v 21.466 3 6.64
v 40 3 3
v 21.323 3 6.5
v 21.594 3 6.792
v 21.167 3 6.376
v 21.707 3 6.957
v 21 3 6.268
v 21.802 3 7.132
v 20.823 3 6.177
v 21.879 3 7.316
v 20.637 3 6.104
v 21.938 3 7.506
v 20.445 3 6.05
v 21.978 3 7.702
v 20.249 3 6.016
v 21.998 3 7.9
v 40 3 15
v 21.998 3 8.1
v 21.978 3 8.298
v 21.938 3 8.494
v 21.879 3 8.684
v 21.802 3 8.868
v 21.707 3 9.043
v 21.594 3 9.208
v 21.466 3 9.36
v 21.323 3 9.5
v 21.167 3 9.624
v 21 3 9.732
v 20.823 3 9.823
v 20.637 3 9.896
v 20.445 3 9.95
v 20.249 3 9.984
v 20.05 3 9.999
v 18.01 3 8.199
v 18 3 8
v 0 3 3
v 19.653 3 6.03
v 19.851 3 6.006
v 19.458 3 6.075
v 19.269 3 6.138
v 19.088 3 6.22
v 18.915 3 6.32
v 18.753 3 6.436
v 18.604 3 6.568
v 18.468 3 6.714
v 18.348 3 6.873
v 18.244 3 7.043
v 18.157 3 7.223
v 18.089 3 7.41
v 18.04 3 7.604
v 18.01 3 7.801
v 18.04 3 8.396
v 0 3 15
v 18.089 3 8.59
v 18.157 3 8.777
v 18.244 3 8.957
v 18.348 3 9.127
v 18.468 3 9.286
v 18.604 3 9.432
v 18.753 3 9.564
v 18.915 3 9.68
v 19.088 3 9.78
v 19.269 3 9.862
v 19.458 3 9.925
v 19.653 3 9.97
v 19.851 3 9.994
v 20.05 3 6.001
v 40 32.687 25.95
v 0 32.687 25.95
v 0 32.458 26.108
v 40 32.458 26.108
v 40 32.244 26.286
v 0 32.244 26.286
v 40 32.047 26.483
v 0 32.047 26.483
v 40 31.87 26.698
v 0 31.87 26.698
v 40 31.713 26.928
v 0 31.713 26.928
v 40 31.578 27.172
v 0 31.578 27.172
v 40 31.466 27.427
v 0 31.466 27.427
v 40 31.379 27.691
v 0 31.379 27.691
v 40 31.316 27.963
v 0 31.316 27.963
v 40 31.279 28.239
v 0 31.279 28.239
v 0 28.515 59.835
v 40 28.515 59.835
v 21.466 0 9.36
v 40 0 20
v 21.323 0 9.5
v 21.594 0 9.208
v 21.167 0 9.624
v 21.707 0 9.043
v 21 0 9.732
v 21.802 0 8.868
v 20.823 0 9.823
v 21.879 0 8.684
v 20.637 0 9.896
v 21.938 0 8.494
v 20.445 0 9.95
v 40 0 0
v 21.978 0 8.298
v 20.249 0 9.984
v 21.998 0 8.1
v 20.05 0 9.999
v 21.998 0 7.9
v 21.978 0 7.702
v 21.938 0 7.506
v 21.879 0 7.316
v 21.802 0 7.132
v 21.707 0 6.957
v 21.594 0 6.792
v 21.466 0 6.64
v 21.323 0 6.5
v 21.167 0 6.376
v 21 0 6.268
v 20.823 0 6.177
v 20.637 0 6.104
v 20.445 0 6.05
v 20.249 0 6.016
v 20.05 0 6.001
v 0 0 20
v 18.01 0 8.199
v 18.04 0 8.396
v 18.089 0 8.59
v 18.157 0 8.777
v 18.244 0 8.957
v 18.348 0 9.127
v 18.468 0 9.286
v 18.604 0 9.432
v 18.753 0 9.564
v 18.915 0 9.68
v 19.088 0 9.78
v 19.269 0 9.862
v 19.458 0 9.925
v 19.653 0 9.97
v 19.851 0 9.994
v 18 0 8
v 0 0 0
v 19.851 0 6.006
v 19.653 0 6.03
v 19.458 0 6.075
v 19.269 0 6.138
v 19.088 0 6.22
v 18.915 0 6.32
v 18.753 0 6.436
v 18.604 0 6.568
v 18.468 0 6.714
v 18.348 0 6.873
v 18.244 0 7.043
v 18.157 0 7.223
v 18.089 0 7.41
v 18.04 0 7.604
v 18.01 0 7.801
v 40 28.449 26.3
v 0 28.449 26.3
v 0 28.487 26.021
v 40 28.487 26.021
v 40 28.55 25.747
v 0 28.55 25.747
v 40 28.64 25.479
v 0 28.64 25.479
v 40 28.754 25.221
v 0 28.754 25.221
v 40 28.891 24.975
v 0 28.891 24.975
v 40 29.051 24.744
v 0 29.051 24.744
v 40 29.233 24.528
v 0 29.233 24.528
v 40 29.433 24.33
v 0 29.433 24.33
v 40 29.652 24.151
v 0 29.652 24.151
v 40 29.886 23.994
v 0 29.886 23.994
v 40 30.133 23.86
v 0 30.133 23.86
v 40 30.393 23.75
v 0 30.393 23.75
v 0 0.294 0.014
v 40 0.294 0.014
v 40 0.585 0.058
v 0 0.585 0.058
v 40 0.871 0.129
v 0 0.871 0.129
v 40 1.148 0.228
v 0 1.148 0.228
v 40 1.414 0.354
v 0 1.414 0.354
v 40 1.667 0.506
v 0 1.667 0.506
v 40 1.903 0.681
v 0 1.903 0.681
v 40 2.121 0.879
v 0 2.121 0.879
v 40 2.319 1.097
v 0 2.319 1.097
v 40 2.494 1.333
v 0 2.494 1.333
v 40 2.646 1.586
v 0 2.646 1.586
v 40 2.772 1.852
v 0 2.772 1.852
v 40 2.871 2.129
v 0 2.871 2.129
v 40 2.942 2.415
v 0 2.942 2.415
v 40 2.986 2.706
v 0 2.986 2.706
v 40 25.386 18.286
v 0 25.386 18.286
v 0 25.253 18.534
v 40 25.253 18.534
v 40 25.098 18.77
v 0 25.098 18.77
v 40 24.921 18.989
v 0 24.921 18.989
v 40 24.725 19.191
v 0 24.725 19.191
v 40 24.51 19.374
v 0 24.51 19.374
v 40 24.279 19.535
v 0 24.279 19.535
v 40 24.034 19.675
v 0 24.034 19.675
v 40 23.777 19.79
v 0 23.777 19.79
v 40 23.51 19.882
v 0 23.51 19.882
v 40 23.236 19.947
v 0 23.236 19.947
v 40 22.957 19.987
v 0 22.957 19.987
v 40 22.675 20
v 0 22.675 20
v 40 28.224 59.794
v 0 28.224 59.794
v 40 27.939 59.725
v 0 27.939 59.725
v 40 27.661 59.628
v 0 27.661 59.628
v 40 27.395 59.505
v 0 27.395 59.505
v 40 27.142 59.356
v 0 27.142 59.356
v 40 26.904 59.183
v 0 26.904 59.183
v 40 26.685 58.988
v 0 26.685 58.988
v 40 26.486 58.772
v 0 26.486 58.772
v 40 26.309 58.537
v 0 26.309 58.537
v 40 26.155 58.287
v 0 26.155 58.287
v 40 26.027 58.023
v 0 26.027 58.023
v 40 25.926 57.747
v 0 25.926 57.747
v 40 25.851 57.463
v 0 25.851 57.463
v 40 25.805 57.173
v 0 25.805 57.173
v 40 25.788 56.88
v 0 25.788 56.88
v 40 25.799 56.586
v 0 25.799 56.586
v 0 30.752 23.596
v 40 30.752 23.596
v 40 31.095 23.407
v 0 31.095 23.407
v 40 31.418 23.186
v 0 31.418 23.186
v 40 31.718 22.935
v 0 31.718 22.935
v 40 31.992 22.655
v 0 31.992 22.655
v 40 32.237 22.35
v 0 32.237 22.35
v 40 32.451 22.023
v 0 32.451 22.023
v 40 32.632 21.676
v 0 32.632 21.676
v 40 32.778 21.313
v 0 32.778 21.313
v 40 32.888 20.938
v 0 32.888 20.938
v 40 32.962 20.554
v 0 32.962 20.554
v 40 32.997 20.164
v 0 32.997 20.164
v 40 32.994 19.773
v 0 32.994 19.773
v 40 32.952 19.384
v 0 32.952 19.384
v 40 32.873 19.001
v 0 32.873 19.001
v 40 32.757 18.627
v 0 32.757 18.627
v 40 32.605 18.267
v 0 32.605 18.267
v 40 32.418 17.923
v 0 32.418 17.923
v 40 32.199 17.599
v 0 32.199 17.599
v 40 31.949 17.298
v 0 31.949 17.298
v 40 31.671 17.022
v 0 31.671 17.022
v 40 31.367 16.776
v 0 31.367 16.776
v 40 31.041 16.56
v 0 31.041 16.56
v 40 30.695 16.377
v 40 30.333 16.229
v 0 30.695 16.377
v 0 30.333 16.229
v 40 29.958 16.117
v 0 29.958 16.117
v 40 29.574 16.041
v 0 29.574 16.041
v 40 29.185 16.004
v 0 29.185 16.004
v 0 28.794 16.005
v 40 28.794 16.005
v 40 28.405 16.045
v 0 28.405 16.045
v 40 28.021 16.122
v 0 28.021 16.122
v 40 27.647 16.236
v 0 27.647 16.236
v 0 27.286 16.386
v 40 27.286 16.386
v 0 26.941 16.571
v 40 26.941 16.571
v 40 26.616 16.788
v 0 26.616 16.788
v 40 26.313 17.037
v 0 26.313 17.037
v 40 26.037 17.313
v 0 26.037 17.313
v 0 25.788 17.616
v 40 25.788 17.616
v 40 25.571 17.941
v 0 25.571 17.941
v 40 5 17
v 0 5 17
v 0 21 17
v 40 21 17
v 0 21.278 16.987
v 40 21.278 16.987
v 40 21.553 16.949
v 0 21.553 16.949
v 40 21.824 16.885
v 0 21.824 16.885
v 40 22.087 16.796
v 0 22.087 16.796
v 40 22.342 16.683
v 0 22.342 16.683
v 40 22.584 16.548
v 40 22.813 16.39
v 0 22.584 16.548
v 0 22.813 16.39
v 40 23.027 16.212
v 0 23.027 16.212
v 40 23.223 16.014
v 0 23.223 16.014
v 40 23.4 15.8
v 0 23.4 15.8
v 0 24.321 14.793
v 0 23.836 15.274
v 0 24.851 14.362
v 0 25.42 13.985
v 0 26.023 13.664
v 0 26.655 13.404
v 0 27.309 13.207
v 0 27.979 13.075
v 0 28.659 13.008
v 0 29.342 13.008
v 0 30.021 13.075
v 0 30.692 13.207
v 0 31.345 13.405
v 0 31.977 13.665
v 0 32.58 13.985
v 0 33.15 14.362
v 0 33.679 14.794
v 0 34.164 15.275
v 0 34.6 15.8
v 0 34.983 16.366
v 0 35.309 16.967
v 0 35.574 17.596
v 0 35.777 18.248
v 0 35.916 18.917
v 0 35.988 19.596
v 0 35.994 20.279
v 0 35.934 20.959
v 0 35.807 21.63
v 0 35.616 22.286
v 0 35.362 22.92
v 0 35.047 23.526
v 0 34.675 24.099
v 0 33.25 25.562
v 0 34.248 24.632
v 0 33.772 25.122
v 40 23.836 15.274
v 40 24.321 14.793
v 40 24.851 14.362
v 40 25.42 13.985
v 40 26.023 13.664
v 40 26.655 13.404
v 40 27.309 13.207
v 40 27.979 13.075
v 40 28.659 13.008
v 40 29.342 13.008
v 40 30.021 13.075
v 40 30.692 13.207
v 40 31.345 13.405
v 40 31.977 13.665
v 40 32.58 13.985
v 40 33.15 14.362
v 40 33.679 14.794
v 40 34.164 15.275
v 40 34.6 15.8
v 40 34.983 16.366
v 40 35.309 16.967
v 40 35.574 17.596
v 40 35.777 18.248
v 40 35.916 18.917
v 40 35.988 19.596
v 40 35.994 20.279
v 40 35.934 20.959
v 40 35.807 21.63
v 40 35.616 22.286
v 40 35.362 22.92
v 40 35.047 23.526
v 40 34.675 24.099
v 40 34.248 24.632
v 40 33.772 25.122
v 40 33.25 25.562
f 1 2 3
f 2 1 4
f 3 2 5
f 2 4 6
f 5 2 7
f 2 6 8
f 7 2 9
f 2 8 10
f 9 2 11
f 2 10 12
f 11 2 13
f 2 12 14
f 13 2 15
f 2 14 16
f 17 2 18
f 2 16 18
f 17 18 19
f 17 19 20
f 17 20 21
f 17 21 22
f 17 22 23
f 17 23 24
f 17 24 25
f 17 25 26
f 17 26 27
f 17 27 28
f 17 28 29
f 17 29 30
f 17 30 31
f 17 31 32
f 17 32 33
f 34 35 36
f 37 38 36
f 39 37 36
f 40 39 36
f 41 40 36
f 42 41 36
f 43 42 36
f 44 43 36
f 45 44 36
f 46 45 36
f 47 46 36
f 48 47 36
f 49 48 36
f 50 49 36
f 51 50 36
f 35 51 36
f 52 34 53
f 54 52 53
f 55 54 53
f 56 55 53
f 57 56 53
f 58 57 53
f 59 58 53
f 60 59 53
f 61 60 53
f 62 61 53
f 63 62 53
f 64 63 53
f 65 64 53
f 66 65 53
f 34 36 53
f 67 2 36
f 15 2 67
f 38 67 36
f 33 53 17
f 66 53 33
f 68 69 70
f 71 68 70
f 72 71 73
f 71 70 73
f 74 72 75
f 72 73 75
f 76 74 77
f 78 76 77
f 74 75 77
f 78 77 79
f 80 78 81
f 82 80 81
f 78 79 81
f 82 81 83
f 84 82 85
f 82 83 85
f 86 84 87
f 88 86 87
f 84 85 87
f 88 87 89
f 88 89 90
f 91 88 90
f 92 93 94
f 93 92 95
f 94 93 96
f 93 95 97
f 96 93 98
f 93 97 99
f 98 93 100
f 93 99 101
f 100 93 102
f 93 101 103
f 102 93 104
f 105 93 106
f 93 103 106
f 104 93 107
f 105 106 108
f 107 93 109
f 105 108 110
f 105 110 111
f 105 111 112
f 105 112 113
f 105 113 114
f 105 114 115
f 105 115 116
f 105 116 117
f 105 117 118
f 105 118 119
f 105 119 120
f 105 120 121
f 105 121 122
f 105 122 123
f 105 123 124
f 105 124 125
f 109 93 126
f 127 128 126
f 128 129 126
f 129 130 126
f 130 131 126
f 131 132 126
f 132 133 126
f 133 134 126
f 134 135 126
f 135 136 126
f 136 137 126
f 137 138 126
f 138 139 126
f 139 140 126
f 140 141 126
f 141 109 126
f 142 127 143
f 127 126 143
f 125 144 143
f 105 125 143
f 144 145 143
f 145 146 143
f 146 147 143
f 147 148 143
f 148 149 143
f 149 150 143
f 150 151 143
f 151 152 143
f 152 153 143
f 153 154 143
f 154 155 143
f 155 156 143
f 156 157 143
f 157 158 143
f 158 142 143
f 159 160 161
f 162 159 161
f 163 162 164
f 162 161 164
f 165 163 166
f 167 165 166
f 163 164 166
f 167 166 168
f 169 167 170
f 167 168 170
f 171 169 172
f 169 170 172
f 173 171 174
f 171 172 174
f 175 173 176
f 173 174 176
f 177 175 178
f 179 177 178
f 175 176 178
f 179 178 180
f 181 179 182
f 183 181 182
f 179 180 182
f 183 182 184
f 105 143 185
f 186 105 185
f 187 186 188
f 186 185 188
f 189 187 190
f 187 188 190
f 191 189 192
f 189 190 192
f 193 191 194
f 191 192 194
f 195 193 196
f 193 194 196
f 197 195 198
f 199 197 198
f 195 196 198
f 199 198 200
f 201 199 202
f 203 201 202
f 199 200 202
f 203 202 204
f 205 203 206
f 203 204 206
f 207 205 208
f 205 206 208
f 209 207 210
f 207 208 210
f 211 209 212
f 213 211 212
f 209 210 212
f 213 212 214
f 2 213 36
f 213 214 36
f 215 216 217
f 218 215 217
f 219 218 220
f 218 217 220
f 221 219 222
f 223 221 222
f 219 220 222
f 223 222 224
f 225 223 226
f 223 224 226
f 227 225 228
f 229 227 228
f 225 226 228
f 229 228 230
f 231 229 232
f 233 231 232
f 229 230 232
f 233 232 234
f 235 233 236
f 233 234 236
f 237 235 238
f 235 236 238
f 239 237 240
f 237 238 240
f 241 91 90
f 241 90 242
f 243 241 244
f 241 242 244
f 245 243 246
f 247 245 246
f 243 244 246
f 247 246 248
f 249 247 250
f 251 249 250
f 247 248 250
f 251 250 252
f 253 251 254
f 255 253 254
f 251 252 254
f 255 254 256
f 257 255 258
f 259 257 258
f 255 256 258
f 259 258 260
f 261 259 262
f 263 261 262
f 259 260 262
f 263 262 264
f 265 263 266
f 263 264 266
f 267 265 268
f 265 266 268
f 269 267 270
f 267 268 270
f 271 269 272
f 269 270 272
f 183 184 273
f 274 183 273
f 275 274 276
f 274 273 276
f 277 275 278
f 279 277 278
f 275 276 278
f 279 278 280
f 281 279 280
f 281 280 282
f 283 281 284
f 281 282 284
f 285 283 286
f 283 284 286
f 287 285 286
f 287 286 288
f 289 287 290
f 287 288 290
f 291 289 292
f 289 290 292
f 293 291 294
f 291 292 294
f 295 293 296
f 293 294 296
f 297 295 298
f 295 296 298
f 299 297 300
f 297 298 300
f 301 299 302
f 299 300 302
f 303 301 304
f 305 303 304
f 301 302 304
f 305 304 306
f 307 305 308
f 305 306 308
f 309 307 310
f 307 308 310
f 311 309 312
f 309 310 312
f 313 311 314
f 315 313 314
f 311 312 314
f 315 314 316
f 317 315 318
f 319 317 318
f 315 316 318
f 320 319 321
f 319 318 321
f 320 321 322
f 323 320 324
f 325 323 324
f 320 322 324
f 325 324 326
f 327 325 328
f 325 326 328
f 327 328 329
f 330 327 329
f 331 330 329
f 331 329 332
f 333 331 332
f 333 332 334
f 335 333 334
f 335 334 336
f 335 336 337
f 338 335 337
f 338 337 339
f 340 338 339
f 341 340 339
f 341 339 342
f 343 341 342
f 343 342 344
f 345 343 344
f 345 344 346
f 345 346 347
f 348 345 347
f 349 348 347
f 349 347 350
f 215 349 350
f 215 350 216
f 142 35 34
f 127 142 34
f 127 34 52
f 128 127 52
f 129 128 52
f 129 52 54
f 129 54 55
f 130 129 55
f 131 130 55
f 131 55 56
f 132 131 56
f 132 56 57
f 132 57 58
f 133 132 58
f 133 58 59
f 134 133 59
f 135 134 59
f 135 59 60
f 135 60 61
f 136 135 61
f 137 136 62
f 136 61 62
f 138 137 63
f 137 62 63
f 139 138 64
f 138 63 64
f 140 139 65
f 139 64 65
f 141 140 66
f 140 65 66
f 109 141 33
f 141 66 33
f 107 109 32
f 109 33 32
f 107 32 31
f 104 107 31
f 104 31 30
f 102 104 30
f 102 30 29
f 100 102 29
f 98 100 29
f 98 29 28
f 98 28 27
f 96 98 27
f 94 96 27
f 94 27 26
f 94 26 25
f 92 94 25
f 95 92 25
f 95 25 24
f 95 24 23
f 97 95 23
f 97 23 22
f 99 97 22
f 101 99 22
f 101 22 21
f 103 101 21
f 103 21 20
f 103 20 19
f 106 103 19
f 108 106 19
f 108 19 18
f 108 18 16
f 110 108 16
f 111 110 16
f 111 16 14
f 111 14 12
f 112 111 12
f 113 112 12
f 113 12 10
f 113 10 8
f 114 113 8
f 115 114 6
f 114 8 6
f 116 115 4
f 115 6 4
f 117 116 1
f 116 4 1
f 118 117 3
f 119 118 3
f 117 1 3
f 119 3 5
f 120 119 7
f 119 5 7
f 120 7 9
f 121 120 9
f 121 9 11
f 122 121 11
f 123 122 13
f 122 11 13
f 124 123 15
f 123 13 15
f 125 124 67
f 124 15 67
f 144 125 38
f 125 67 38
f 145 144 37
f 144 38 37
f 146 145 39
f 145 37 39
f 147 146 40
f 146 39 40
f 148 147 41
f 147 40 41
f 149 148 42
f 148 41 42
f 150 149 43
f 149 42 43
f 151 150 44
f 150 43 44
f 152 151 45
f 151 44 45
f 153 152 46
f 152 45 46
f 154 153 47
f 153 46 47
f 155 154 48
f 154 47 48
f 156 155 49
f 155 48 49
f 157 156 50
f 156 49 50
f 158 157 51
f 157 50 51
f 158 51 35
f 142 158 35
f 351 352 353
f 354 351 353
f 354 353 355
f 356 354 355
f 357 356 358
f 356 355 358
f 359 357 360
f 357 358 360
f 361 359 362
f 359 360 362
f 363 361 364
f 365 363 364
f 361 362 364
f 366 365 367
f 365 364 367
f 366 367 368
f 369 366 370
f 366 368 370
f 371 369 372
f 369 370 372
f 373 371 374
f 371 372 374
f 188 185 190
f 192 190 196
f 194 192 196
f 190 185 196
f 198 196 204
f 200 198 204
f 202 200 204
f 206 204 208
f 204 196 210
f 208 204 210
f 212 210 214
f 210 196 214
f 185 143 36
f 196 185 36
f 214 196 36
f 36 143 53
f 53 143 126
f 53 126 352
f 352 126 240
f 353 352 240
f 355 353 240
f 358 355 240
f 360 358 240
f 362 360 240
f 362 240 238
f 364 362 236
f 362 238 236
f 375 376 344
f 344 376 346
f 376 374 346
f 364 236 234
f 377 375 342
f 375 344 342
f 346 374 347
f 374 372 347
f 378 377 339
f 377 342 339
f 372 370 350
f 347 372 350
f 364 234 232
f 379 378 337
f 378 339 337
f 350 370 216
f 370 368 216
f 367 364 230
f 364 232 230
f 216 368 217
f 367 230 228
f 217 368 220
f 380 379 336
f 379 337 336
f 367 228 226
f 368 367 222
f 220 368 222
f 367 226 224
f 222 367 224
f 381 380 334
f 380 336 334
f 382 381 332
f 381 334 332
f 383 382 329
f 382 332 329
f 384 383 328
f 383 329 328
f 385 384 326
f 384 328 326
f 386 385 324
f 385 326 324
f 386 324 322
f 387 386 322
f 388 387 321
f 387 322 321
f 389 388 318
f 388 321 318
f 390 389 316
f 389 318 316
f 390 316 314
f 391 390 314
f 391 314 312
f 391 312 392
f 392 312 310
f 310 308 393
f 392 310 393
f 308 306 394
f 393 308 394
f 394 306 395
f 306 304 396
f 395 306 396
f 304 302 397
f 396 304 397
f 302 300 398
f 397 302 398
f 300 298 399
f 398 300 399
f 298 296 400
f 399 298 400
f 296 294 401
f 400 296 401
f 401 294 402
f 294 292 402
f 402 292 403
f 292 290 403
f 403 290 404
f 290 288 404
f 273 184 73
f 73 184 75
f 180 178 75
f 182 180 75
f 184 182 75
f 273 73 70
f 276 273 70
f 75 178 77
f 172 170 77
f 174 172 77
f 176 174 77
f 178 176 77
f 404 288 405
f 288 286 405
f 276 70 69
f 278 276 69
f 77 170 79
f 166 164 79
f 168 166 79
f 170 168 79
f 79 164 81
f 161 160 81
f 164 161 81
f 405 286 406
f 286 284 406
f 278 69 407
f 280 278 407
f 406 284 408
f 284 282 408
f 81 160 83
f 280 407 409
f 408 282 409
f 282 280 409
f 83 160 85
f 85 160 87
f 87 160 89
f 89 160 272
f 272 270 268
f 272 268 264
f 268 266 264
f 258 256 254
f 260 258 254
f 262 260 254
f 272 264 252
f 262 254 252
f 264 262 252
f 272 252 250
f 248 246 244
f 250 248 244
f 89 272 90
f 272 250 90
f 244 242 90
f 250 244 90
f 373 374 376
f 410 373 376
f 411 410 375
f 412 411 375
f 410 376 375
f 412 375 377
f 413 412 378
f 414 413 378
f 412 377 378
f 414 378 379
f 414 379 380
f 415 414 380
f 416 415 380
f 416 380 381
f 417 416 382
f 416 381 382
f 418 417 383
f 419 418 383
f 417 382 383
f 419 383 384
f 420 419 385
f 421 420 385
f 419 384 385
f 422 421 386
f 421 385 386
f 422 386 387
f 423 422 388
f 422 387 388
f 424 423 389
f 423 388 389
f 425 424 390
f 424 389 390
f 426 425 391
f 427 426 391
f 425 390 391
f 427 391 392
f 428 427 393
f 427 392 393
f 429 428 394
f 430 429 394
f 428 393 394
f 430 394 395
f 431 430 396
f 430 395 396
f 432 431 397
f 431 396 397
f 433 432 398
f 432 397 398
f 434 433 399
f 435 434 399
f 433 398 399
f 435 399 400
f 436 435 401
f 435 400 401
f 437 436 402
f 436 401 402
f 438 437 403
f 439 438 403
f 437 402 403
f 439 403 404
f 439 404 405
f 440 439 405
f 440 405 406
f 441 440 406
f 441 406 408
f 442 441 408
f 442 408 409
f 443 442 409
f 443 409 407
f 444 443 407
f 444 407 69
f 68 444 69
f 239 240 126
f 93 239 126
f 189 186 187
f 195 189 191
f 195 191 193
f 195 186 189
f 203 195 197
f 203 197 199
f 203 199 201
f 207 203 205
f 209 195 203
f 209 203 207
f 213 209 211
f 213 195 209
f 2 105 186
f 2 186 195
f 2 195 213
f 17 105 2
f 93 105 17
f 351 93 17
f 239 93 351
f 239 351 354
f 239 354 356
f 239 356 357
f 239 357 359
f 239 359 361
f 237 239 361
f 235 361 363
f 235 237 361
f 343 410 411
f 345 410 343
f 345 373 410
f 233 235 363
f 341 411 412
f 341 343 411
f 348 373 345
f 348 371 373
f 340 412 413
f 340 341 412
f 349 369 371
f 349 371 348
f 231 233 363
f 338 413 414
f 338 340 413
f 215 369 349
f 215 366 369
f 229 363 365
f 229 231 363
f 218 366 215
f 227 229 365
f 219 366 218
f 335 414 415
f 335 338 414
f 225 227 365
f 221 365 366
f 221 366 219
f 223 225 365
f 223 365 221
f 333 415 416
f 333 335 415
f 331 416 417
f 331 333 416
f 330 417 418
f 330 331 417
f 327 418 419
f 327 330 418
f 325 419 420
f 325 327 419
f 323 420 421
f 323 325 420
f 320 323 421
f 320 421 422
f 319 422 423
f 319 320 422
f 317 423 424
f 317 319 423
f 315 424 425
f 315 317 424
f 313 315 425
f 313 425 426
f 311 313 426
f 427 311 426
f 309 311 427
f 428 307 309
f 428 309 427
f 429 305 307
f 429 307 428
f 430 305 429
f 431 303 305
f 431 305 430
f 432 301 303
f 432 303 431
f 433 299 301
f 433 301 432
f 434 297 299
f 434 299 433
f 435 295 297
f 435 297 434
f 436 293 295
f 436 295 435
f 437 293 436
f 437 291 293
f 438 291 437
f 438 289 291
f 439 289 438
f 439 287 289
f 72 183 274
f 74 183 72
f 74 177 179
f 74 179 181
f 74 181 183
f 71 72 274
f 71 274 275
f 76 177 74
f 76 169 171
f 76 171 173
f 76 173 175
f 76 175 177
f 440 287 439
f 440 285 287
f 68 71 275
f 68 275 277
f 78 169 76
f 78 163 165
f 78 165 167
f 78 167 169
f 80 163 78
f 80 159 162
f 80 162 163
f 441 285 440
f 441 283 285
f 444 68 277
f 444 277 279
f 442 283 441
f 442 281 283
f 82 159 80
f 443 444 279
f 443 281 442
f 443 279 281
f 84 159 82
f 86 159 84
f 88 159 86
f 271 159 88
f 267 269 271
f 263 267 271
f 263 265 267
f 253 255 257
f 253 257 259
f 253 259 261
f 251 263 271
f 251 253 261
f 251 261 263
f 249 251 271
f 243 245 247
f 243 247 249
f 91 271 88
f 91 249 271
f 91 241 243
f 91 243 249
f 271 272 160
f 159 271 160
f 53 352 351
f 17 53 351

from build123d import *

# Parameters (mm, degrees)
F1_DEPTH = 40
F2_R     = 2
F3_DEPTH = 9.6
F4_SIZE  = 2


with BuildPart() as f1:
    # F0 (on Right) → F1 (new body)
    with BuildSketch(Plane.YZ):
        with BuildLine():
            Line((0, 20), (0, 0))
            ThreePointArc((0, 0), (2.12132, 0.87868), (3, 3))
            Line((3, 3), (3, 17))
            Line((3, 17), (21, 17))
            ThreePointArc((21, 17), (22.341641, 16.683282), (23.4, 15.8))
            ThreePointArc((23.4, 15.8), (34.164312, 15.27455), (32.687463, 25.95001))
            ThreePointArc((32.687463, 25.95001), (31.712786, 26.927793), (31.279221, 28.238547))
            Line((31.279221, 28.238547), (28.514858, 59.835355))
            ThreePointArc((28.514858, 59.835355), (26.485898, 58.771775), (25.799112, 56.586321))
            Line((25.799112, 56.586321), (28.448779, 26.300488))
            ThreePointArc((28.448779, 26.300488), (29.051308, 24.74351), (30.392779, 23.749689))
            ThreePointArc((30.392779, 23.749689), (31.949109, 17.297639), (25.385968, 18.285714))
            ThreePointArc((25.385968, 18.285714), (24.279012, 19.535463), (22.675445, 20))
            Line((22.675445, 20), (0, 20))
        make_face()
    extrude(amount=F1_DEPTH)

    # F2 (on face) → F3 (cut)
    with BuildSketch(Plane(origin=(0, 3, 0), x_dir=(-1, 0, 0), z_dir=(0, 1, 0))):
        with Locations((-20, 8)):
            Circle(F2_R)
    extrude(amount=-F3_DEPTH, mode=Mode.SUBTRACT)

    # F4
    f4_edges = [f1.edges().sort_by_distance(p)[0] for p in [
        (20, 3, 17),
    ]]
    chamfer(f4_edges, length=F4_SIZE)


solid = f1.part
